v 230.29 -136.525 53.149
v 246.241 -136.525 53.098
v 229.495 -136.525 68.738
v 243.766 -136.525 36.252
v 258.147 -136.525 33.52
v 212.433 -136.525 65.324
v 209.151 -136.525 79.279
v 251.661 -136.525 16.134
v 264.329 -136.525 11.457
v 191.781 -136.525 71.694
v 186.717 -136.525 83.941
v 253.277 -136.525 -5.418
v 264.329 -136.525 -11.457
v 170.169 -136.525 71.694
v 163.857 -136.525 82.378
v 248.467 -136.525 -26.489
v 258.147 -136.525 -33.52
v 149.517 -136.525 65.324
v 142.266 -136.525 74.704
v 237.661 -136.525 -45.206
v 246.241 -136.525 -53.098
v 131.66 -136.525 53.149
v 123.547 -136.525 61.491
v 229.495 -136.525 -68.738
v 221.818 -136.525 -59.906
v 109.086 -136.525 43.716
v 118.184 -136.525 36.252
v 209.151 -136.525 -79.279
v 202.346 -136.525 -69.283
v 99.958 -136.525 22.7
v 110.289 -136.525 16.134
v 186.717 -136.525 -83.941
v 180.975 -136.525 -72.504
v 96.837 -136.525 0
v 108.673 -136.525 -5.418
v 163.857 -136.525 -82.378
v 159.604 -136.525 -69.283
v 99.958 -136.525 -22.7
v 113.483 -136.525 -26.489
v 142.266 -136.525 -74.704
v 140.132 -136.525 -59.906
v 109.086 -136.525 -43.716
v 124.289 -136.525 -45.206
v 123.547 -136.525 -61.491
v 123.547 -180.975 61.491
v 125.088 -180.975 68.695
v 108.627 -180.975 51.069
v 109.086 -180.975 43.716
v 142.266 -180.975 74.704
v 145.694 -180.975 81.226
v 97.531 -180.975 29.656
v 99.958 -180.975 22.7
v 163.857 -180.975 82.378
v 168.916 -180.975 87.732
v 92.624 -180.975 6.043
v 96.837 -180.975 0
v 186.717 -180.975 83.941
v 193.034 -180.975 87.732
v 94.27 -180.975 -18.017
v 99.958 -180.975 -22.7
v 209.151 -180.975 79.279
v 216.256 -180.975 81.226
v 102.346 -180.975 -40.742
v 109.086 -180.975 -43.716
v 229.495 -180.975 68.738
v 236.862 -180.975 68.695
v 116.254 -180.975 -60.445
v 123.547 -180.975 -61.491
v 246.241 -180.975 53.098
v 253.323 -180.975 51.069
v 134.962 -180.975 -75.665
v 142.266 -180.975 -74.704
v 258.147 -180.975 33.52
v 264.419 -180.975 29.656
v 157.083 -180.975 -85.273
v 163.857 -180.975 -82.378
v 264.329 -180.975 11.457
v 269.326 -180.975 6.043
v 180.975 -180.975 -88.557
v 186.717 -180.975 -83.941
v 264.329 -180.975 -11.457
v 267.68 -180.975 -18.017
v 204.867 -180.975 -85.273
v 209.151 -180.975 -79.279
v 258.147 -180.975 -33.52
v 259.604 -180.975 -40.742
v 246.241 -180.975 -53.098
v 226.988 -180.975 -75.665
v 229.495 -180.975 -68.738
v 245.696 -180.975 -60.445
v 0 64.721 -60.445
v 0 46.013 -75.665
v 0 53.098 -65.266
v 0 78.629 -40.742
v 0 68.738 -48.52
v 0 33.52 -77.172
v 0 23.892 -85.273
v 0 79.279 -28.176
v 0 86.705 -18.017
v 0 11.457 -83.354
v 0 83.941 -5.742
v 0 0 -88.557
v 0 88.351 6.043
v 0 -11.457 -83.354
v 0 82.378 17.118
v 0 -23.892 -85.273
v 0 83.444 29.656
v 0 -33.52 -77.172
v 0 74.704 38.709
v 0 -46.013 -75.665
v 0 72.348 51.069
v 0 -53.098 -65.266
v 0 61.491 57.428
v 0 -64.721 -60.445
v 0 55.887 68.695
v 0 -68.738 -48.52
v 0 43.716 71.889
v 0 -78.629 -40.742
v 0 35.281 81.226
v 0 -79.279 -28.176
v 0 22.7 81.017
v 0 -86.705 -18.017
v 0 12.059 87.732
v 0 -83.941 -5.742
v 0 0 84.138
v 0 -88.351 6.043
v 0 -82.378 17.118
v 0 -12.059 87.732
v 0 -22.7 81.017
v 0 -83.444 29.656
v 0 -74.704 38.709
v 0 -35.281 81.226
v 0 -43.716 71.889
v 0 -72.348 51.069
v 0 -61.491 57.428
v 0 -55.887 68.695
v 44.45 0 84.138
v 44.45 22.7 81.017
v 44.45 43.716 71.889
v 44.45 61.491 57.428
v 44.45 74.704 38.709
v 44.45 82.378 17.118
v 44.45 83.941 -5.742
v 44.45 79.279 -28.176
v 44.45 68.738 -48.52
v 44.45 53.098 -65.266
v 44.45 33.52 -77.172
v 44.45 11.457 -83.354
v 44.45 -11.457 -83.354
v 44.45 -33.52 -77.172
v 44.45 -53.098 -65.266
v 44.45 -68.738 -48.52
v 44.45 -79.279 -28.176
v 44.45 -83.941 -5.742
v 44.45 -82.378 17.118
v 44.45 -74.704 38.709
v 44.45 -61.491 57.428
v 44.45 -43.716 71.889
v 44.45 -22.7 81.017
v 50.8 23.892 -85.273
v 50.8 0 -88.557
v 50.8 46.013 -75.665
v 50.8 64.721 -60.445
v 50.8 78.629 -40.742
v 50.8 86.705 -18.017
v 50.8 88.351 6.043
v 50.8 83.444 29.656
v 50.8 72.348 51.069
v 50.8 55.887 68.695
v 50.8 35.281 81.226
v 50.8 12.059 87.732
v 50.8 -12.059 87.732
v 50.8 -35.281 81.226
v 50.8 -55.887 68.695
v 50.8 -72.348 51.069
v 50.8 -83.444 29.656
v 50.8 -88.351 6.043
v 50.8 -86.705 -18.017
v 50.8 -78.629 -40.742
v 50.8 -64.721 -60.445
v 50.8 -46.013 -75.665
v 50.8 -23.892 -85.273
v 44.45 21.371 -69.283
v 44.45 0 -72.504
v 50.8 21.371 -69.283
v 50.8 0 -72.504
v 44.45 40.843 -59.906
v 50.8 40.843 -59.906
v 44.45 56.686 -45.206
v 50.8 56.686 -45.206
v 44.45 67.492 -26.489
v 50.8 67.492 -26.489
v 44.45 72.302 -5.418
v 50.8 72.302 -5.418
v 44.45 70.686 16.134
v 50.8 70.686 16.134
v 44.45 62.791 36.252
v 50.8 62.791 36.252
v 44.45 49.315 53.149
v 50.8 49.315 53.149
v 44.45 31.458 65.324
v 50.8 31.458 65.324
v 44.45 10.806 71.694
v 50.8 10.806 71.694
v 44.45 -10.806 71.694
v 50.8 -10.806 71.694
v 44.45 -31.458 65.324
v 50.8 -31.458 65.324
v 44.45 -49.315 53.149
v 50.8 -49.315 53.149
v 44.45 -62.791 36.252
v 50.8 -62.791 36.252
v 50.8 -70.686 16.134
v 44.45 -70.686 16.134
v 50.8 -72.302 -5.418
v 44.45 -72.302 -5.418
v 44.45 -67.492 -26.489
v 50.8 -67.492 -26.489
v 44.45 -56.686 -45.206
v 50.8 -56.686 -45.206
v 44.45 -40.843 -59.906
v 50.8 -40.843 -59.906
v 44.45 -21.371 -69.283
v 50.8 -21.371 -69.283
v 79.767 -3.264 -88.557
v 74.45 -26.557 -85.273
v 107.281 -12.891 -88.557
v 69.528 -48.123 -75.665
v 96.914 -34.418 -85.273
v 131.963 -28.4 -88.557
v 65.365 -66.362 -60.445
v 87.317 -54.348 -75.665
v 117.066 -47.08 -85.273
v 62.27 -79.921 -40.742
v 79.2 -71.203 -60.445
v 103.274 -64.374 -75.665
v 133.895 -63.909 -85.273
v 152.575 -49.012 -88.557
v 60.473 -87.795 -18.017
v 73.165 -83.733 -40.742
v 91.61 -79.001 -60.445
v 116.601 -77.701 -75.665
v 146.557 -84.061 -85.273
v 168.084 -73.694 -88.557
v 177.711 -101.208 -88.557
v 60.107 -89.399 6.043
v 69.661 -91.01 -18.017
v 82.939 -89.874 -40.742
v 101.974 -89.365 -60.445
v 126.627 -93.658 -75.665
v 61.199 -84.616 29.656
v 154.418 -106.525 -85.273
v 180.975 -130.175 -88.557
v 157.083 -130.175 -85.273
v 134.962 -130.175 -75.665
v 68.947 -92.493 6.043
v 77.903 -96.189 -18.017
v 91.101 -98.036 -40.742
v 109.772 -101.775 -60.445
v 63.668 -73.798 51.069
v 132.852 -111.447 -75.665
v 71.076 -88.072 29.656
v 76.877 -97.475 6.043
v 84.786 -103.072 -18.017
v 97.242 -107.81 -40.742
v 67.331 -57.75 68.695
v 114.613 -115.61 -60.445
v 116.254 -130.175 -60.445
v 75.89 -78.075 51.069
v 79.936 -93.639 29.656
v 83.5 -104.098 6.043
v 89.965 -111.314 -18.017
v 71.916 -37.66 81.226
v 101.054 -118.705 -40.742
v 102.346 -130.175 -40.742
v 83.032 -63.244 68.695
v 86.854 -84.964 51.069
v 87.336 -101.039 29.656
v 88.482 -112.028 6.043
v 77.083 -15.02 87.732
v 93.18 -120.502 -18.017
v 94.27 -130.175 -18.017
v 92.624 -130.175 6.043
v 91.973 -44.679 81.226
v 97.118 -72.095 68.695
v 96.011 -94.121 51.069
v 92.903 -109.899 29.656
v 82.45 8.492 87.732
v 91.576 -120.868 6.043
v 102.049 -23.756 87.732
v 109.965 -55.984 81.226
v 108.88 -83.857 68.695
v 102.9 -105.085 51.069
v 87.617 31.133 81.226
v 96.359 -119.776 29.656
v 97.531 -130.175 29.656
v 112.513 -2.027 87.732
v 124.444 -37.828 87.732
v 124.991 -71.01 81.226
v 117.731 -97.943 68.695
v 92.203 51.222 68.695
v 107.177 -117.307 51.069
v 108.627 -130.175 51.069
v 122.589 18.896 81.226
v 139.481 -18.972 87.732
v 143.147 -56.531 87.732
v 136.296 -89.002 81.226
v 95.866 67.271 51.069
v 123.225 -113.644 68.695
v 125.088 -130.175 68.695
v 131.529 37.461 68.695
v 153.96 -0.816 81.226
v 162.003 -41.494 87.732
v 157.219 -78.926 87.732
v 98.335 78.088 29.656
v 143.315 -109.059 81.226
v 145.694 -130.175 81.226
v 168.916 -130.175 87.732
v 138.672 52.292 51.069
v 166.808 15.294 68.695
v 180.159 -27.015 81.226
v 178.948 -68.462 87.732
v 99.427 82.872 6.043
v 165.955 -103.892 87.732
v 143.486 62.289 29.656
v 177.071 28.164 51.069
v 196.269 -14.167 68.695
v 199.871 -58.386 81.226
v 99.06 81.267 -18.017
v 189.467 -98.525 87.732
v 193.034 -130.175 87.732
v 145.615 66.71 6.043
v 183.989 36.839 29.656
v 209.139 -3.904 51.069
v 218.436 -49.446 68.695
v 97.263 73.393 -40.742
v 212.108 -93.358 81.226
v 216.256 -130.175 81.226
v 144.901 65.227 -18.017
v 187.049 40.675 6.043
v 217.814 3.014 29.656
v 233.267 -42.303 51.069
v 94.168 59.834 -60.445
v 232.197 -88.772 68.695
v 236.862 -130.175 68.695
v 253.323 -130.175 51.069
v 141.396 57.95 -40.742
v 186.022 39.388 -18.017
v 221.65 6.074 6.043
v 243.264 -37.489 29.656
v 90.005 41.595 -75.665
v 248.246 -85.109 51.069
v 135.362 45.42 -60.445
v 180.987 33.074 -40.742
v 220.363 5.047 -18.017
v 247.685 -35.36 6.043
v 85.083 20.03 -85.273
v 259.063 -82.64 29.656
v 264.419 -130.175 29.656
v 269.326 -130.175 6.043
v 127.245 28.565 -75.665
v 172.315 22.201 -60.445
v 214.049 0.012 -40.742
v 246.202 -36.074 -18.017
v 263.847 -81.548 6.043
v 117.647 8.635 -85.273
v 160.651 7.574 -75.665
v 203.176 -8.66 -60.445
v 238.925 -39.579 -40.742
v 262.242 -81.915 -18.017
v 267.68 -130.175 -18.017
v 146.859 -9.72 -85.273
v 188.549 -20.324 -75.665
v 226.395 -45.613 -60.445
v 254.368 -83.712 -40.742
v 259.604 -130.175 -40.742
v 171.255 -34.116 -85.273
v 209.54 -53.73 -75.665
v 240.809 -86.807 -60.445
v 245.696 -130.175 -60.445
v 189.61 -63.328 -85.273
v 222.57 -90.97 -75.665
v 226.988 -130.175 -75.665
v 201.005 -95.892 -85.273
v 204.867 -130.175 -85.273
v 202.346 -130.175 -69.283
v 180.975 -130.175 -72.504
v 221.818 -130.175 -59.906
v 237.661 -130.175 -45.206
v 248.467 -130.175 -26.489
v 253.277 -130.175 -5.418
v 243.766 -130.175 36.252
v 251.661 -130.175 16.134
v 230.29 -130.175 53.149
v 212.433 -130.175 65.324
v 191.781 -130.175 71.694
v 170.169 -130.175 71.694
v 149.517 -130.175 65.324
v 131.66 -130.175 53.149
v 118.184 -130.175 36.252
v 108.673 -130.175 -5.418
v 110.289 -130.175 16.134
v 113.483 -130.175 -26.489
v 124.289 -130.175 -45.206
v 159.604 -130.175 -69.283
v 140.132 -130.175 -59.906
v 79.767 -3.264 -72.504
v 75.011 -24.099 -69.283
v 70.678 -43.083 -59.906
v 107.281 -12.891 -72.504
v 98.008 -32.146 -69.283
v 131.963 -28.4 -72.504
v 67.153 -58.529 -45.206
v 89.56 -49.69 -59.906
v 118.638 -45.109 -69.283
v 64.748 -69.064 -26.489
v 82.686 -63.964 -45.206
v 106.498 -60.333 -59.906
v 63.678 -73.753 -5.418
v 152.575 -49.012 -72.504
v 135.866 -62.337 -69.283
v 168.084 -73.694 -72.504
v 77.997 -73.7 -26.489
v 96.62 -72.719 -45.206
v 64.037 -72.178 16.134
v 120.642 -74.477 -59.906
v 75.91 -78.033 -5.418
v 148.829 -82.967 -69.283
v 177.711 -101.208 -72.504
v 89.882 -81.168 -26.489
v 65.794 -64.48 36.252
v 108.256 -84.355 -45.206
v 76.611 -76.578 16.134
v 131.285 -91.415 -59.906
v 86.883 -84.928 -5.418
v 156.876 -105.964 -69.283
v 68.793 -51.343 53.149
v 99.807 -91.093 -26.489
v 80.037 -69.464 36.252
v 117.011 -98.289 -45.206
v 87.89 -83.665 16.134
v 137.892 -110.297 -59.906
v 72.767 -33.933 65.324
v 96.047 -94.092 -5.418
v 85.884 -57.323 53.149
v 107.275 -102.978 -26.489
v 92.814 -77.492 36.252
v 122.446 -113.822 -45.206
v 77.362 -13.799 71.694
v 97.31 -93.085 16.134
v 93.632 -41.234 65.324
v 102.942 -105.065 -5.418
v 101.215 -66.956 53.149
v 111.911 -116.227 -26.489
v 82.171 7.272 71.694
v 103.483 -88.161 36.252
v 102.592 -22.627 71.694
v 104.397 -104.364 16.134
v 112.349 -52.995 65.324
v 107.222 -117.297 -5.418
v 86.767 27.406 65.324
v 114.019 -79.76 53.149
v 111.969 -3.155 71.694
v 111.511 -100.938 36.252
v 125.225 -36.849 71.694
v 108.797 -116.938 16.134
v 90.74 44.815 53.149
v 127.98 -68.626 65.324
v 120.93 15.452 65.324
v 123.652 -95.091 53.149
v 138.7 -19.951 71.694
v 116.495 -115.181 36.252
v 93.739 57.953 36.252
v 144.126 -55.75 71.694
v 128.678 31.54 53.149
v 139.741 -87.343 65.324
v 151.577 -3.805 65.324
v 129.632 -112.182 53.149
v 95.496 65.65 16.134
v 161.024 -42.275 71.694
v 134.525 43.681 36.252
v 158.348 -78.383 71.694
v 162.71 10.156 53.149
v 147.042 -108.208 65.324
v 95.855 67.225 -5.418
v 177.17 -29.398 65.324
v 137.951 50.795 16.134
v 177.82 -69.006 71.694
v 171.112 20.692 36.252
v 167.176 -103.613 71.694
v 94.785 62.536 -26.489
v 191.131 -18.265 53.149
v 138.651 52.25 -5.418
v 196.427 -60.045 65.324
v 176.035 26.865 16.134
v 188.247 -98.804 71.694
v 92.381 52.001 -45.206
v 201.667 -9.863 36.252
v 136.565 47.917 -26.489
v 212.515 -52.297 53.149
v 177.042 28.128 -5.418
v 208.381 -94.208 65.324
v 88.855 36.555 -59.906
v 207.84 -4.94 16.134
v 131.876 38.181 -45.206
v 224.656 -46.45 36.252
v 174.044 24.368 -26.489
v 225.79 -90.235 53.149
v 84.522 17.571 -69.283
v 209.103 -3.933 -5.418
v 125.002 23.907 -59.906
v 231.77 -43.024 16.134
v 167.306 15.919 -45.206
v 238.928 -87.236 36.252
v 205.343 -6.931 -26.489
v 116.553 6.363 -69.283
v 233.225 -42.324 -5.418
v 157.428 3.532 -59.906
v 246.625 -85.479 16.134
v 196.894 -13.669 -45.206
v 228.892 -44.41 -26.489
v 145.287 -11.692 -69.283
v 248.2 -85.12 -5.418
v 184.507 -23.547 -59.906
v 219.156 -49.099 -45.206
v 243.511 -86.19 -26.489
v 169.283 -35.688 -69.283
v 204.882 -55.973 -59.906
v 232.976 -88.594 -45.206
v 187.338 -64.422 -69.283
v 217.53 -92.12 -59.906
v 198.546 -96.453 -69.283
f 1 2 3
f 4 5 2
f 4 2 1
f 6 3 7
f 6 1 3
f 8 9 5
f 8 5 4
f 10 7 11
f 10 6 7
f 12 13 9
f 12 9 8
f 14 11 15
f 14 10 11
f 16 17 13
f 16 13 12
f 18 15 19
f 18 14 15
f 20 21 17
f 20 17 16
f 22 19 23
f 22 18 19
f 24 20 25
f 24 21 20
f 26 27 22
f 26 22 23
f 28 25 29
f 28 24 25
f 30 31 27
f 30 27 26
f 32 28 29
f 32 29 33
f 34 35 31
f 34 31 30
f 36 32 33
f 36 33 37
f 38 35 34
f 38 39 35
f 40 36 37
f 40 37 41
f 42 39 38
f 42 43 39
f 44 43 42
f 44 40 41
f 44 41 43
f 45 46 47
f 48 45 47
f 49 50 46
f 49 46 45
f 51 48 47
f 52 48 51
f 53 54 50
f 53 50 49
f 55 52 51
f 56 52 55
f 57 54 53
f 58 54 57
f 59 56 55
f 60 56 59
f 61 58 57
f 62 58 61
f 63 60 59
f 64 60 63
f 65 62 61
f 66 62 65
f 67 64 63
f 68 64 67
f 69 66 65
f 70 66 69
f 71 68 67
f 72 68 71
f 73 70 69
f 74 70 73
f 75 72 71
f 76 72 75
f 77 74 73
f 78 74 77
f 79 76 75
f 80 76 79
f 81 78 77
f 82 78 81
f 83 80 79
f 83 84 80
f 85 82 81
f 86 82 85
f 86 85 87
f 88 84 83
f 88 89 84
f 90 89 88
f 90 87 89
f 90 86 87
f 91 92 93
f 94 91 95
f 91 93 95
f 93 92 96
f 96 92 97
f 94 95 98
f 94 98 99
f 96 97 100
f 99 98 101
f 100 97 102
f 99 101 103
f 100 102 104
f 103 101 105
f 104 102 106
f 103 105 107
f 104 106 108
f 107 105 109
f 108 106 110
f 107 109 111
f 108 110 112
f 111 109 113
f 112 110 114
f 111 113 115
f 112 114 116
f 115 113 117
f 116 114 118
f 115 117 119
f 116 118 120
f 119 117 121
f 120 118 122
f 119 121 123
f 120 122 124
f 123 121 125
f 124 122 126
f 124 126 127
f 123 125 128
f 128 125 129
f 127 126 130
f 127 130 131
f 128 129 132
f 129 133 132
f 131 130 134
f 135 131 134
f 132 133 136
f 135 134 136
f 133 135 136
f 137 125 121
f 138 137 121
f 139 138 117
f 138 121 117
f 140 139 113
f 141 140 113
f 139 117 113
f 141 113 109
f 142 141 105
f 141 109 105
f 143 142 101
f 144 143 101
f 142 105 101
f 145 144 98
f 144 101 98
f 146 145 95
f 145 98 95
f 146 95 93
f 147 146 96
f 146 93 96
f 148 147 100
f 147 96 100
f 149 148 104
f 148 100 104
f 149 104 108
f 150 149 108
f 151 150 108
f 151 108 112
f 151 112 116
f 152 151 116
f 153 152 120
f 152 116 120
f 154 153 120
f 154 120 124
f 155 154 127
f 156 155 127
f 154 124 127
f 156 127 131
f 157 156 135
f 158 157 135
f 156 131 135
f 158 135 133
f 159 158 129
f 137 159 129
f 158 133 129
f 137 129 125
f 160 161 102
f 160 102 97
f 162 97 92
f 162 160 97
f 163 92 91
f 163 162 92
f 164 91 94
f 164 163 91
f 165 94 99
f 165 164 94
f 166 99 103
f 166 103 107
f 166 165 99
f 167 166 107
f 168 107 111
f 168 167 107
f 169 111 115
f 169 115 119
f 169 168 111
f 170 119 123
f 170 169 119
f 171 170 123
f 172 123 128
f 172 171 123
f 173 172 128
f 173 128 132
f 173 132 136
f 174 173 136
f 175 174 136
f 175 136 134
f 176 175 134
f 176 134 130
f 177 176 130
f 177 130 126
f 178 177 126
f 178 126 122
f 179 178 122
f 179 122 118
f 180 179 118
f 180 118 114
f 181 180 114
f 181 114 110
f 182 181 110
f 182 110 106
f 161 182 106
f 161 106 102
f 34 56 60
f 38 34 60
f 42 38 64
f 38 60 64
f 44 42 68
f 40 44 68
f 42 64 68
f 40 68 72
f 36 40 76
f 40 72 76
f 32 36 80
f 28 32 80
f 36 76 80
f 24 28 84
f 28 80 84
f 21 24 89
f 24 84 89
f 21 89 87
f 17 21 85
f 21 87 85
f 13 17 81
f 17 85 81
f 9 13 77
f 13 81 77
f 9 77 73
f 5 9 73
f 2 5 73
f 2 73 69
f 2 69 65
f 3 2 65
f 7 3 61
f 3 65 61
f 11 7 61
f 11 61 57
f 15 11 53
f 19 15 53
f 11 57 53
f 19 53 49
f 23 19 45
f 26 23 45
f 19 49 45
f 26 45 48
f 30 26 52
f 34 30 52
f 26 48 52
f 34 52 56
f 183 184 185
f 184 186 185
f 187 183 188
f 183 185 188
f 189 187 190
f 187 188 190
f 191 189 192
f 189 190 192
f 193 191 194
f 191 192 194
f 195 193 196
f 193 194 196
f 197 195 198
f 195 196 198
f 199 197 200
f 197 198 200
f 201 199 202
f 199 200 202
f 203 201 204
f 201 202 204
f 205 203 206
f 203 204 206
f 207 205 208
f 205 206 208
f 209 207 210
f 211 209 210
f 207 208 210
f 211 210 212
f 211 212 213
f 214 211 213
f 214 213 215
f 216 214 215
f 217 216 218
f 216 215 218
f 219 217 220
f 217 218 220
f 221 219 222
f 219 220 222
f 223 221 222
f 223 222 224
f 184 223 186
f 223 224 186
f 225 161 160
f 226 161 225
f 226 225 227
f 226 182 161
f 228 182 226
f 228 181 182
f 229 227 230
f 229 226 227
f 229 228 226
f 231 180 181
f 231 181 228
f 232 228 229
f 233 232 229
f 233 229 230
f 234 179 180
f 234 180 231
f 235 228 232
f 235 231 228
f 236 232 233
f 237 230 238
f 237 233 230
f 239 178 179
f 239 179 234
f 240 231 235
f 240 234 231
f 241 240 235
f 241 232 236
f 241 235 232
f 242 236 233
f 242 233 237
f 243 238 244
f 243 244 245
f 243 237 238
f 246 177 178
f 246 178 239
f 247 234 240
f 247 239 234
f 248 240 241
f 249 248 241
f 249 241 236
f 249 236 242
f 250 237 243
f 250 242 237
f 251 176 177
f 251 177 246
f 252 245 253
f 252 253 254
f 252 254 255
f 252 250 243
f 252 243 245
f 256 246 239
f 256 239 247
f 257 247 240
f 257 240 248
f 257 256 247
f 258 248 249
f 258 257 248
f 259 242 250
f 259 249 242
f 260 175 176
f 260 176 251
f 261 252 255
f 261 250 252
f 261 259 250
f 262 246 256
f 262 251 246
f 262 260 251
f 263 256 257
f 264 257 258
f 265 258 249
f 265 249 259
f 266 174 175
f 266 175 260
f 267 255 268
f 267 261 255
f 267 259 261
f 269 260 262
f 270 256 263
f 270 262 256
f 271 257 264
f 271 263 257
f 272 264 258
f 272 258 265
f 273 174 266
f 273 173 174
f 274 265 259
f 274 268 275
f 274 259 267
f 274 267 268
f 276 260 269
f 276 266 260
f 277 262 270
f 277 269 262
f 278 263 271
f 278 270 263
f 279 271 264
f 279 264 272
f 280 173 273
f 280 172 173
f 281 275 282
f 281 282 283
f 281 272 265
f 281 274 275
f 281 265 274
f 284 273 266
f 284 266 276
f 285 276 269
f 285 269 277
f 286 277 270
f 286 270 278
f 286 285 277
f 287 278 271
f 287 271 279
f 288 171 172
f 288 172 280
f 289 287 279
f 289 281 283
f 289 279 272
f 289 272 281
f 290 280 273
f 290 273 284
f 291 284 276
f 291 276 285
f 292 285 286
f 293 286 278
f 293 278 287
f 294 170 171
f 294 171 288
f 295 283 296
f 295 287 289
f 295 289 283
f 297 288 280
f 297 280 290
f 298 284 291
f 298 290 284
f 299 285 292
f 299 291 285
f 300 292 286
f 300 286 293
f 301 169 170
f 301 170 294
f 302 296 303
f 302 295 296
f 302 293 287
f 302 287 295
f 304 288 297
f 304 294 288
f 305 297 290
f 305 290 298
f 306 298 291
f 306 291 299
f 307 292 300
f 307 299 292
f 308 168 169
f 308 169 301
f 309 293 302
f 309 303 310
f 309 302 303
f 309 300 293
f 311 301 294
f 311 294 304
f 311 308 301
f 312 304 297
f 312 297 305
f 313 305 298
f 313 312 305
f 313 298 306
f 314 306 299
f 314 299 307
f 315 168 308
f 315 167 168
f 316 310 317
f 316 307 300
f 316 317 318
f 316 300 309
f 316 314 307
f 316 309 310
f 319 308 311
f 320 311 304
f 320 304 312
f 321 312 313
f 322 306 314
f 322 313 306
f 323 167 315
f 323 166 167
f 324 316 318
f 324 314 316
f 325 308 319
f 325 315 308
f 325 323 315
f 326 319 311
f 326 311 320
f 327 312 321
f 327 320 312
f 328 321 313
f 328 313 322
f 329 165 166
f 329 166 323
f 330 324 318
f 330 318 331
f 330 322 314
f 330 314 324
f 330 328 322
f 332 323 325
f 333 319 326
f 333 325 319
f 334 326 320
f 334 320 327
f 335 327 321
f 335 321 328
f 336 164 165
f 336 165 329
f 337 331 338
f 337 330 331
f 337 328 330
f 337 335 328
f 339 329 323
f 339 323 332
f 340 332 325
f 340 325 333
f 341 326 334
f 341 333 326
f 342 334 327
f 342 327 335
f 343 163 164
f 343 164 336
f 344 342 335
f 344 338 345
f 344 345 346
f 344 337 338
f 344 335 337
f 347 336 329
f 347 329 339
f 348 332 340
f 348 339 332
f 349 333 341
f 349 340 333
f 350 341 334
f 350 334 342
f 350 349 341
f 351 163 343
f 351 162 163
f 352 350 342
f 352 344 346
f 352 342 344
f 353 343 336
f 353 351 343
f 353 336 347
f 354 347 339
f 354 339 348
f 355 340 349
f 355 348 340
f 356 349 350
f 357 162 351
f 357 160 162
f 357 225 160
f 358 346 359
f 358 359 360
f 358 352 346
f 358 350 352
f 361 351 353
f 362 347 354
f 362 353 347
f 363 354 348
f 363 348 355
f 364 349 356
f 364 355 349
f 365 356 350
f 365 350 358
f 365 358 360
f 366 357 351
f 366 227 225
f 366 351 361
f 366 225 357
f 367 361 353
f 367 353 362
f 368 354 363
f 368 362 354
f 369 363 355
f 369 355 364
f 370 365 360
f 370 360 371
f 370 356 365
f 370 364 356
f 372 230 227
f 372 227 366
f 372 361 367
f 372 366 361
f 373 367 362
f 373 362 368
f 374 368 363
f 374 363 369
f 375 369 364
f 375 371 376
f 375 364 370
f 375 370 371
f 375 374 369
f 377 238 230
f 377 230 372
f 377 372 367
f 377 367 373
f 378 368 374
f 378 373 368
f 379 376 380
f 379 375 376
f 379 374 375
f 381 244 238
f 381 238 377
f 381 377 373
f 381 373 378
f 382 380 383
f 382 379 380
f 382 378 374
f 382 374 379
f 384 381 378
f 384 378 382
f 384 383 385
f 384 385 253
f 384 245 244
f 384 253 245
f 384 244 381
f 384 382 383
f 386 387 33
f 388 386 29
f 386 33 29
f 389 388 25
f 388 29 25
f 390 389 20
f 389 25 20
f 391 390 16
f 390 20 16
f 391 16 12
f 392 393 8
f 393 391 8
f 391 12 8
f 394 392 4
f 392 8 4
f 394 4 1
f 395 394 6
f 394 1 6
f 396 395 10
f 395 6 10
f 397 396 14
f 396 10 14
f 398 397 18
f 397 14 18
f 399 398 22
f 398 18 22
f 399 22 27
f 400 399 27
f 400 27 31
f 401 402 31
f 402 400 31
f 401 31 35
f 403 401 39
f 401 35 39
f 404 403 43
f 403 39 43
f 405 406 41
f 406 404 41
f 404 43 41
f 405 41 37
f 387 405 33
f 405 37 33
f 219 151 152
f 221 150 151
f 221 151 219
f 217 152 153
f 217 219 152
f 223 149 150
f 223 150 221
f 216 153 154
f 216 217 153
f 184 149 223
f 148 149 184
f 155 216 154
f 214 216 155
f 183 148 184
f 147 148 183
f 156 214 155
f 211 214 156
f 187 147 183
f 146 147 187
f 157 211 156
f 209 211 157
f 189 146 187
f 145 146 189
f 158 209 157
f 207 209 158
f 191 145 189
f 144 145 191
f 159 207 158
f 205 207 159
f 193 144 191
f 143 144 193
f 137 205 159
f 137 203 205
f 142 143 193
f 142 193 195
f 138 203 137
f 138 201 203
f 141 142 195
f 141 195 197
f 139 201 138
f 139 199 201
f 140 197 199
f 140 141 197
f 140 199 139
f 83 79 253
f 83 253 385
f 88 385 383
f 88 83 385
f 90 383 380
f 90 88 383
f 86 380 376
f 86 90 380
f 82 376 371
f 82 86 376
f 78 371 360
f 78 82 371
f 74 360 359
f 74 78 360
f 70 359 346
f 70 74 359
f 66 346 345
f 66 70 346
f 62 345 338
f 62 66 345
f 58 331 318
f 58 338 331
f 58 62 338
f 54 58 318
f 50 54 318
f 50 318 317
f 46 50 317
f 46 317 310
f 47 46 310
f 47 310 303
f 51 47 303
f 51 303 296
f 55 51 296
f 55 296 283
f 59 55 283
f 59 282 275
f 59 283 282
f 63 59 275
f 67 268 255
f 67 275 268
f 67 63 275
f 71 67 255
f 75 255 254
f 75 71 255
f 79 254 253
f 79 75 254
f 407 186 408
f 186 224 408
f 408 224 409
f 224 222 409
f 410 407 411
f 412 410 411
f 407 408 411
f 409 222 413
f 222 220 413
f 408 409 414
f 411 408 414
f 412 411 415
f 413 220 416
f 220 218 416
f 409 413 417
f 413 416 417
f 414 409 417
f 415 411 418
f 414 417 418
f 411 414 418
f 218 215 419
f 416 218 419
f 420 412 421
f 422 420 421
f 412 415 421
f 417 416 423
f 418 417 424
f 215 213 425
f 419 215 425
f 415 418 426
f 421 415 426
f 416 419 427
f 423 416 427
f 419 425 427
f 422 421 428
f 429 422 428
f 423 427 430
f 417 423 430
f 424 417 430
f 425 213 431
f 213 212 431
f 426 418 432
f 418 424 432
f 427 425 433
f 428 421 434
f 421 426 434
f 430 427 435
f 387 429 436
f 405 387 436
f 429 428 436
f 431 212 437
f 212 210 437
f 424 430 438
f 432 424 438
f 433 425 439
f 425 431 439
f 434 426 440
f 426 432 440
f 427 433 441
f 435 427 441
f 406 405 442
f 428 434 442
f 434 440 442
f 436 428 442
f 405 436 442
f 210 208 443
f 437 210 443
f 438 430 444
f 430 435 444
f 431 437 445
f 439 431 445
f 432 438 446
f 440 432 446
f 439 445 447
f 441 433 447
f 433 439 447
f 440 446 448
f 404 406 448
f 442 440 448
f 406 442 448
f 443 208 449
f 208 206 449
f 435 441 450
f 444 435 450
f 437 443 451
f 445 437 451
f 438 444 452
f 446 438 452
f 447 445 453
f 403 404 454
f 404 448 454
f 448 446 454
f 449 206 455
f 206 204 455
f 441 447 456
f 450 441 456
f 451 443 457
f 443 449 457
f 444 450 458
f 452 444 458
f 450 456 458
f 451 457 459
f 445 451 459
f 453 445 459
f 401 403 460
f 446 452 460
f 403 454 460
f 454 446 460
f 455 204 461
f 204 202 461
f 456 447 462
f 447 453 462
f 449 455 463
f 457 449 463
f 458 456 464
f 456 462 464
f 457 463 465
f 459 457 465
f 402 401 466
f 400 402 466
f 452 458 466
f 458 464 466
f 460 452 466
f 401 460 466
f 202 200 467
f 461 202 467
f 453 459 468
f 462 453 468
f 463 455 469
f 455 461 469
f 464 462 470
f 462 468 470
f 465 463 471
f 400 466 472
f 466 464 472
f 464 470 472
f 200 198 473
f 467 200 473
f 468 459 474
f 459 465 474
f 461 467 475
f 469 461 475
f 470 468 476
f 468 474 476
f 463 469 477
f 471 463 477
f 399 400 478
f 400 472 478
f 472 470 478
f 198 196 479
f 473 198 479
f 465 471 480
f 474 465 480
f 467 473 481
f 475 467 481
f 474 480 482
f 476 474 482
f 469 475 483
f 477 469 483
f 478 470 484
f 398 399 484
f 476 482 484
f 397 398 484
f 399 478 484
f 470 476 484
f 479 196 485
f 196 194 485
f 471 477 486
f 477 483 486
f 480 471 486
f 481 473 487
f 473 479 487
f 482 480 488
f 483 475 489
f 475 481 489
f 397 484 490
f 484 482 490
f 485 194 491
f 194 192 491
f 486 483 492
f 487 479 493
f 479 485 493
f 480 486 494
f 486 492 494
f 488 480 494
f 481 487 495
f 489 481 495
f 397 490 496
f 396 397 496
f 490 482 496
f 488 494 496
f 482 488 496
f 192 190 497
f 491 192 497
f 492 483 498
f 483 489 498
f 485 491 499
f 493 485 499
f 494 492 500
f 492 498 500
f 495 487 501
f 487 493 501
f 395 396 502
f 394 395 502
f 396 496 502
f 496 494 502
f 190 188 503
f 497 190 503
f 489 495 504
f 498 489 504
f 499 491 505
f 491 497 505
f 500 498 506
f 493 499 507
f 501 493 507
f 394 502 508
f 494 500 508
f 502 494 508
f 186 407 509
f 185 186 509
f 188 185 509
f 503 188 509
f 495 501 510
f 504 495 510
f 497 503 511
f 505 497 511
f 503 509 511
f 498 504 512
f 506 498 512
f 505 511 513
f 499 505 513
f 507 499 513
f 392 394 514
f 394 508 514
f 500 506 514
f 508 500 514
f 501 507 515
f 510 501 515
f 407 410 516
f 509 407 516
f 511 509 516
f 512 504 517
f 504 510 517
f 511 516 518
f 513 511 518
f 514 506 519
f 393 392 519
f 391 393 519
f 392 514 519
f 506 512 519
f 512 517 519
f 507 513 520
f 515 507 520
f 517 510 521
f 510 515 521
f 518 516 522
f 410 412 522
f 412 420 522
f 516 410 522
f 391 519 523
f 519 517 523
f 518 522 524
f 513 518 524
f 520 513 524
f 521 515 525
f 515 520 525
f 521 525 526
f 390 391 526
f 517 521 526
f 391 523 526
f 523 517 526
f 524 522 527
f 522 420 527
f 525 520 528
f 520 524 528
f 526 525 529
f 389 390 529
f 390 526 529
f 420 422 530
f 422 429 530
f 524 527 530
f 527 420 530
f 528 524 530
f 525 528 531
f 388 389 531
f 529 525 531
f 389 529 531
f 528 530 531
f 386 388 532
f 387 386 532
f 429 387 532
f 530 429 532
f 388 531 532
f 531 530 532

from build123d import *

# Parameters (mm, degrees)
SKETCH1_R          = 88.5571
SKETCH1_R_2        = 72.5043
SKETCH3_R          = 84.1375
CUT_EXTRUDE1_DEPTH = 44.45
SKETCH4_R          = 84.1375
CUT_EXTRUDE2_DEPTH = 44.45


with BuildPart() as part:
    # Sweep1: sweep along a path in Sketch2
    with BuildLine(Plane.XY) as sweep1_path:
        Line((0, 0), (50.8, 0))
        ThreePointArc((50.8, 0), (142.847625241, -38.127374759), (180.975, -130.175))
        Line((180.975, -130.175), (180.975, -180.975))
    # Sketch1 → Sweep1 (sweep)
    with BuildSketch(Plane(origin=(0, 0, 0), x_dir=(0, 0, -1), z_dir=(1, 0, 0))):
        Circle(SKETCH1_R)
        Circle(SKETCH1_R_2, mode=Mode.SUBTRACT)
    sweep(path=sweep1_path.line)

    # Sketch3 → Cut-Extrude1 (cut)
    with BuildSketch(Plane(origin=(0, -180.975, 0), x_dir=(-1, 0, 0), z_dir=(0, -1, 0))):
        with Locations((-180.975, 0)):
            Circle(SKETCH3_R)
    extrude(amount=-CUT_EXTRUDE1_DEPTH, mode=Mode.SUBTRACT)

    # Sketch4 → Cut-Extrude2 (cut)
    with BuildSketch(Plane.ZY):
        Circle(SKETCH4_R)
    extrude(amount=-CUT_EXTRUDE2_DEPTH, mode=Mode.SUBTRACT)


solid = part.part
